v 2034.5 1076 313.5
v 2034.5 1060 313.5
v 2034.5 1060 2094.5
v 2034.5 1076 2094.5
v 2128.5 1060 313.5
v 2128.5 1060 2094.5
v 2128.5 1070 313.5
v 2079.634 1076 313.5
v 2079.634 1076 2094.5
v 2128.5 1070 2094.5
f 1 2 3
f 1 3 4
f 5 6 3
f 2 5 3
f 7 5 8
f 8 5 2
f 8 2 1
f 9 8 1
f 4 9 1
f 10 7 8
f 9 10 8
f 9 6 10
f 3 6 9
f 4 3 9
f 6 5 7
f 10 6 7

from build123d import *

# Parameters (mm, degrees)
BOX003001_W               = 16
BOX003001_H               = 94
BOX003001_DEPTH           = 1781
BOX003001_PLACEMENT_ANGLE = 82.999975
BOX003_W                  = 16
BOX003_H                  = 94
BOX003_DEPTH              = 1781


with BuildPart() as q002:
    # Box003001 → Box003001 (new body)
    with BuildSketch(Plane.XY):
        with Locations((8, 47)):
            Rectangle(BOX003001_W, BOX003001_H)
    extrude(amount=BOX003001_DEPTH)


with BuildPart() as q002_1:
    # Box003001 placement: moved
    add(q002.part.moved(Location((2144, 1070, 313.5))).rotate(Axis((2144, 1070, 313.5), (0, 0, 1)), BOX003001_PLACEMENT_ANGLE))


with BuildPart() as cut:
    # Box003 → Box003 (new body)
    with BuildSketch(Plane(origin=(2144, 1060, 313.5), x_dir=(0, 1, 0), z_dir=(0, 0, 1))):
        with Locations((8, 47)):
            Rectangle(BOX003_W, BOX003_H)
    extrude(amount=BOX003_DEPTH)

    # Cut: cut Q002
    add(q002_1.part, mode=Mode.SUBTRACT)


with BuildPart() as cut_1:
    # Cut placement: moved
    add(cut.part.moved(Location((-15.5, 0, 0))))


solid = cut_1.part
